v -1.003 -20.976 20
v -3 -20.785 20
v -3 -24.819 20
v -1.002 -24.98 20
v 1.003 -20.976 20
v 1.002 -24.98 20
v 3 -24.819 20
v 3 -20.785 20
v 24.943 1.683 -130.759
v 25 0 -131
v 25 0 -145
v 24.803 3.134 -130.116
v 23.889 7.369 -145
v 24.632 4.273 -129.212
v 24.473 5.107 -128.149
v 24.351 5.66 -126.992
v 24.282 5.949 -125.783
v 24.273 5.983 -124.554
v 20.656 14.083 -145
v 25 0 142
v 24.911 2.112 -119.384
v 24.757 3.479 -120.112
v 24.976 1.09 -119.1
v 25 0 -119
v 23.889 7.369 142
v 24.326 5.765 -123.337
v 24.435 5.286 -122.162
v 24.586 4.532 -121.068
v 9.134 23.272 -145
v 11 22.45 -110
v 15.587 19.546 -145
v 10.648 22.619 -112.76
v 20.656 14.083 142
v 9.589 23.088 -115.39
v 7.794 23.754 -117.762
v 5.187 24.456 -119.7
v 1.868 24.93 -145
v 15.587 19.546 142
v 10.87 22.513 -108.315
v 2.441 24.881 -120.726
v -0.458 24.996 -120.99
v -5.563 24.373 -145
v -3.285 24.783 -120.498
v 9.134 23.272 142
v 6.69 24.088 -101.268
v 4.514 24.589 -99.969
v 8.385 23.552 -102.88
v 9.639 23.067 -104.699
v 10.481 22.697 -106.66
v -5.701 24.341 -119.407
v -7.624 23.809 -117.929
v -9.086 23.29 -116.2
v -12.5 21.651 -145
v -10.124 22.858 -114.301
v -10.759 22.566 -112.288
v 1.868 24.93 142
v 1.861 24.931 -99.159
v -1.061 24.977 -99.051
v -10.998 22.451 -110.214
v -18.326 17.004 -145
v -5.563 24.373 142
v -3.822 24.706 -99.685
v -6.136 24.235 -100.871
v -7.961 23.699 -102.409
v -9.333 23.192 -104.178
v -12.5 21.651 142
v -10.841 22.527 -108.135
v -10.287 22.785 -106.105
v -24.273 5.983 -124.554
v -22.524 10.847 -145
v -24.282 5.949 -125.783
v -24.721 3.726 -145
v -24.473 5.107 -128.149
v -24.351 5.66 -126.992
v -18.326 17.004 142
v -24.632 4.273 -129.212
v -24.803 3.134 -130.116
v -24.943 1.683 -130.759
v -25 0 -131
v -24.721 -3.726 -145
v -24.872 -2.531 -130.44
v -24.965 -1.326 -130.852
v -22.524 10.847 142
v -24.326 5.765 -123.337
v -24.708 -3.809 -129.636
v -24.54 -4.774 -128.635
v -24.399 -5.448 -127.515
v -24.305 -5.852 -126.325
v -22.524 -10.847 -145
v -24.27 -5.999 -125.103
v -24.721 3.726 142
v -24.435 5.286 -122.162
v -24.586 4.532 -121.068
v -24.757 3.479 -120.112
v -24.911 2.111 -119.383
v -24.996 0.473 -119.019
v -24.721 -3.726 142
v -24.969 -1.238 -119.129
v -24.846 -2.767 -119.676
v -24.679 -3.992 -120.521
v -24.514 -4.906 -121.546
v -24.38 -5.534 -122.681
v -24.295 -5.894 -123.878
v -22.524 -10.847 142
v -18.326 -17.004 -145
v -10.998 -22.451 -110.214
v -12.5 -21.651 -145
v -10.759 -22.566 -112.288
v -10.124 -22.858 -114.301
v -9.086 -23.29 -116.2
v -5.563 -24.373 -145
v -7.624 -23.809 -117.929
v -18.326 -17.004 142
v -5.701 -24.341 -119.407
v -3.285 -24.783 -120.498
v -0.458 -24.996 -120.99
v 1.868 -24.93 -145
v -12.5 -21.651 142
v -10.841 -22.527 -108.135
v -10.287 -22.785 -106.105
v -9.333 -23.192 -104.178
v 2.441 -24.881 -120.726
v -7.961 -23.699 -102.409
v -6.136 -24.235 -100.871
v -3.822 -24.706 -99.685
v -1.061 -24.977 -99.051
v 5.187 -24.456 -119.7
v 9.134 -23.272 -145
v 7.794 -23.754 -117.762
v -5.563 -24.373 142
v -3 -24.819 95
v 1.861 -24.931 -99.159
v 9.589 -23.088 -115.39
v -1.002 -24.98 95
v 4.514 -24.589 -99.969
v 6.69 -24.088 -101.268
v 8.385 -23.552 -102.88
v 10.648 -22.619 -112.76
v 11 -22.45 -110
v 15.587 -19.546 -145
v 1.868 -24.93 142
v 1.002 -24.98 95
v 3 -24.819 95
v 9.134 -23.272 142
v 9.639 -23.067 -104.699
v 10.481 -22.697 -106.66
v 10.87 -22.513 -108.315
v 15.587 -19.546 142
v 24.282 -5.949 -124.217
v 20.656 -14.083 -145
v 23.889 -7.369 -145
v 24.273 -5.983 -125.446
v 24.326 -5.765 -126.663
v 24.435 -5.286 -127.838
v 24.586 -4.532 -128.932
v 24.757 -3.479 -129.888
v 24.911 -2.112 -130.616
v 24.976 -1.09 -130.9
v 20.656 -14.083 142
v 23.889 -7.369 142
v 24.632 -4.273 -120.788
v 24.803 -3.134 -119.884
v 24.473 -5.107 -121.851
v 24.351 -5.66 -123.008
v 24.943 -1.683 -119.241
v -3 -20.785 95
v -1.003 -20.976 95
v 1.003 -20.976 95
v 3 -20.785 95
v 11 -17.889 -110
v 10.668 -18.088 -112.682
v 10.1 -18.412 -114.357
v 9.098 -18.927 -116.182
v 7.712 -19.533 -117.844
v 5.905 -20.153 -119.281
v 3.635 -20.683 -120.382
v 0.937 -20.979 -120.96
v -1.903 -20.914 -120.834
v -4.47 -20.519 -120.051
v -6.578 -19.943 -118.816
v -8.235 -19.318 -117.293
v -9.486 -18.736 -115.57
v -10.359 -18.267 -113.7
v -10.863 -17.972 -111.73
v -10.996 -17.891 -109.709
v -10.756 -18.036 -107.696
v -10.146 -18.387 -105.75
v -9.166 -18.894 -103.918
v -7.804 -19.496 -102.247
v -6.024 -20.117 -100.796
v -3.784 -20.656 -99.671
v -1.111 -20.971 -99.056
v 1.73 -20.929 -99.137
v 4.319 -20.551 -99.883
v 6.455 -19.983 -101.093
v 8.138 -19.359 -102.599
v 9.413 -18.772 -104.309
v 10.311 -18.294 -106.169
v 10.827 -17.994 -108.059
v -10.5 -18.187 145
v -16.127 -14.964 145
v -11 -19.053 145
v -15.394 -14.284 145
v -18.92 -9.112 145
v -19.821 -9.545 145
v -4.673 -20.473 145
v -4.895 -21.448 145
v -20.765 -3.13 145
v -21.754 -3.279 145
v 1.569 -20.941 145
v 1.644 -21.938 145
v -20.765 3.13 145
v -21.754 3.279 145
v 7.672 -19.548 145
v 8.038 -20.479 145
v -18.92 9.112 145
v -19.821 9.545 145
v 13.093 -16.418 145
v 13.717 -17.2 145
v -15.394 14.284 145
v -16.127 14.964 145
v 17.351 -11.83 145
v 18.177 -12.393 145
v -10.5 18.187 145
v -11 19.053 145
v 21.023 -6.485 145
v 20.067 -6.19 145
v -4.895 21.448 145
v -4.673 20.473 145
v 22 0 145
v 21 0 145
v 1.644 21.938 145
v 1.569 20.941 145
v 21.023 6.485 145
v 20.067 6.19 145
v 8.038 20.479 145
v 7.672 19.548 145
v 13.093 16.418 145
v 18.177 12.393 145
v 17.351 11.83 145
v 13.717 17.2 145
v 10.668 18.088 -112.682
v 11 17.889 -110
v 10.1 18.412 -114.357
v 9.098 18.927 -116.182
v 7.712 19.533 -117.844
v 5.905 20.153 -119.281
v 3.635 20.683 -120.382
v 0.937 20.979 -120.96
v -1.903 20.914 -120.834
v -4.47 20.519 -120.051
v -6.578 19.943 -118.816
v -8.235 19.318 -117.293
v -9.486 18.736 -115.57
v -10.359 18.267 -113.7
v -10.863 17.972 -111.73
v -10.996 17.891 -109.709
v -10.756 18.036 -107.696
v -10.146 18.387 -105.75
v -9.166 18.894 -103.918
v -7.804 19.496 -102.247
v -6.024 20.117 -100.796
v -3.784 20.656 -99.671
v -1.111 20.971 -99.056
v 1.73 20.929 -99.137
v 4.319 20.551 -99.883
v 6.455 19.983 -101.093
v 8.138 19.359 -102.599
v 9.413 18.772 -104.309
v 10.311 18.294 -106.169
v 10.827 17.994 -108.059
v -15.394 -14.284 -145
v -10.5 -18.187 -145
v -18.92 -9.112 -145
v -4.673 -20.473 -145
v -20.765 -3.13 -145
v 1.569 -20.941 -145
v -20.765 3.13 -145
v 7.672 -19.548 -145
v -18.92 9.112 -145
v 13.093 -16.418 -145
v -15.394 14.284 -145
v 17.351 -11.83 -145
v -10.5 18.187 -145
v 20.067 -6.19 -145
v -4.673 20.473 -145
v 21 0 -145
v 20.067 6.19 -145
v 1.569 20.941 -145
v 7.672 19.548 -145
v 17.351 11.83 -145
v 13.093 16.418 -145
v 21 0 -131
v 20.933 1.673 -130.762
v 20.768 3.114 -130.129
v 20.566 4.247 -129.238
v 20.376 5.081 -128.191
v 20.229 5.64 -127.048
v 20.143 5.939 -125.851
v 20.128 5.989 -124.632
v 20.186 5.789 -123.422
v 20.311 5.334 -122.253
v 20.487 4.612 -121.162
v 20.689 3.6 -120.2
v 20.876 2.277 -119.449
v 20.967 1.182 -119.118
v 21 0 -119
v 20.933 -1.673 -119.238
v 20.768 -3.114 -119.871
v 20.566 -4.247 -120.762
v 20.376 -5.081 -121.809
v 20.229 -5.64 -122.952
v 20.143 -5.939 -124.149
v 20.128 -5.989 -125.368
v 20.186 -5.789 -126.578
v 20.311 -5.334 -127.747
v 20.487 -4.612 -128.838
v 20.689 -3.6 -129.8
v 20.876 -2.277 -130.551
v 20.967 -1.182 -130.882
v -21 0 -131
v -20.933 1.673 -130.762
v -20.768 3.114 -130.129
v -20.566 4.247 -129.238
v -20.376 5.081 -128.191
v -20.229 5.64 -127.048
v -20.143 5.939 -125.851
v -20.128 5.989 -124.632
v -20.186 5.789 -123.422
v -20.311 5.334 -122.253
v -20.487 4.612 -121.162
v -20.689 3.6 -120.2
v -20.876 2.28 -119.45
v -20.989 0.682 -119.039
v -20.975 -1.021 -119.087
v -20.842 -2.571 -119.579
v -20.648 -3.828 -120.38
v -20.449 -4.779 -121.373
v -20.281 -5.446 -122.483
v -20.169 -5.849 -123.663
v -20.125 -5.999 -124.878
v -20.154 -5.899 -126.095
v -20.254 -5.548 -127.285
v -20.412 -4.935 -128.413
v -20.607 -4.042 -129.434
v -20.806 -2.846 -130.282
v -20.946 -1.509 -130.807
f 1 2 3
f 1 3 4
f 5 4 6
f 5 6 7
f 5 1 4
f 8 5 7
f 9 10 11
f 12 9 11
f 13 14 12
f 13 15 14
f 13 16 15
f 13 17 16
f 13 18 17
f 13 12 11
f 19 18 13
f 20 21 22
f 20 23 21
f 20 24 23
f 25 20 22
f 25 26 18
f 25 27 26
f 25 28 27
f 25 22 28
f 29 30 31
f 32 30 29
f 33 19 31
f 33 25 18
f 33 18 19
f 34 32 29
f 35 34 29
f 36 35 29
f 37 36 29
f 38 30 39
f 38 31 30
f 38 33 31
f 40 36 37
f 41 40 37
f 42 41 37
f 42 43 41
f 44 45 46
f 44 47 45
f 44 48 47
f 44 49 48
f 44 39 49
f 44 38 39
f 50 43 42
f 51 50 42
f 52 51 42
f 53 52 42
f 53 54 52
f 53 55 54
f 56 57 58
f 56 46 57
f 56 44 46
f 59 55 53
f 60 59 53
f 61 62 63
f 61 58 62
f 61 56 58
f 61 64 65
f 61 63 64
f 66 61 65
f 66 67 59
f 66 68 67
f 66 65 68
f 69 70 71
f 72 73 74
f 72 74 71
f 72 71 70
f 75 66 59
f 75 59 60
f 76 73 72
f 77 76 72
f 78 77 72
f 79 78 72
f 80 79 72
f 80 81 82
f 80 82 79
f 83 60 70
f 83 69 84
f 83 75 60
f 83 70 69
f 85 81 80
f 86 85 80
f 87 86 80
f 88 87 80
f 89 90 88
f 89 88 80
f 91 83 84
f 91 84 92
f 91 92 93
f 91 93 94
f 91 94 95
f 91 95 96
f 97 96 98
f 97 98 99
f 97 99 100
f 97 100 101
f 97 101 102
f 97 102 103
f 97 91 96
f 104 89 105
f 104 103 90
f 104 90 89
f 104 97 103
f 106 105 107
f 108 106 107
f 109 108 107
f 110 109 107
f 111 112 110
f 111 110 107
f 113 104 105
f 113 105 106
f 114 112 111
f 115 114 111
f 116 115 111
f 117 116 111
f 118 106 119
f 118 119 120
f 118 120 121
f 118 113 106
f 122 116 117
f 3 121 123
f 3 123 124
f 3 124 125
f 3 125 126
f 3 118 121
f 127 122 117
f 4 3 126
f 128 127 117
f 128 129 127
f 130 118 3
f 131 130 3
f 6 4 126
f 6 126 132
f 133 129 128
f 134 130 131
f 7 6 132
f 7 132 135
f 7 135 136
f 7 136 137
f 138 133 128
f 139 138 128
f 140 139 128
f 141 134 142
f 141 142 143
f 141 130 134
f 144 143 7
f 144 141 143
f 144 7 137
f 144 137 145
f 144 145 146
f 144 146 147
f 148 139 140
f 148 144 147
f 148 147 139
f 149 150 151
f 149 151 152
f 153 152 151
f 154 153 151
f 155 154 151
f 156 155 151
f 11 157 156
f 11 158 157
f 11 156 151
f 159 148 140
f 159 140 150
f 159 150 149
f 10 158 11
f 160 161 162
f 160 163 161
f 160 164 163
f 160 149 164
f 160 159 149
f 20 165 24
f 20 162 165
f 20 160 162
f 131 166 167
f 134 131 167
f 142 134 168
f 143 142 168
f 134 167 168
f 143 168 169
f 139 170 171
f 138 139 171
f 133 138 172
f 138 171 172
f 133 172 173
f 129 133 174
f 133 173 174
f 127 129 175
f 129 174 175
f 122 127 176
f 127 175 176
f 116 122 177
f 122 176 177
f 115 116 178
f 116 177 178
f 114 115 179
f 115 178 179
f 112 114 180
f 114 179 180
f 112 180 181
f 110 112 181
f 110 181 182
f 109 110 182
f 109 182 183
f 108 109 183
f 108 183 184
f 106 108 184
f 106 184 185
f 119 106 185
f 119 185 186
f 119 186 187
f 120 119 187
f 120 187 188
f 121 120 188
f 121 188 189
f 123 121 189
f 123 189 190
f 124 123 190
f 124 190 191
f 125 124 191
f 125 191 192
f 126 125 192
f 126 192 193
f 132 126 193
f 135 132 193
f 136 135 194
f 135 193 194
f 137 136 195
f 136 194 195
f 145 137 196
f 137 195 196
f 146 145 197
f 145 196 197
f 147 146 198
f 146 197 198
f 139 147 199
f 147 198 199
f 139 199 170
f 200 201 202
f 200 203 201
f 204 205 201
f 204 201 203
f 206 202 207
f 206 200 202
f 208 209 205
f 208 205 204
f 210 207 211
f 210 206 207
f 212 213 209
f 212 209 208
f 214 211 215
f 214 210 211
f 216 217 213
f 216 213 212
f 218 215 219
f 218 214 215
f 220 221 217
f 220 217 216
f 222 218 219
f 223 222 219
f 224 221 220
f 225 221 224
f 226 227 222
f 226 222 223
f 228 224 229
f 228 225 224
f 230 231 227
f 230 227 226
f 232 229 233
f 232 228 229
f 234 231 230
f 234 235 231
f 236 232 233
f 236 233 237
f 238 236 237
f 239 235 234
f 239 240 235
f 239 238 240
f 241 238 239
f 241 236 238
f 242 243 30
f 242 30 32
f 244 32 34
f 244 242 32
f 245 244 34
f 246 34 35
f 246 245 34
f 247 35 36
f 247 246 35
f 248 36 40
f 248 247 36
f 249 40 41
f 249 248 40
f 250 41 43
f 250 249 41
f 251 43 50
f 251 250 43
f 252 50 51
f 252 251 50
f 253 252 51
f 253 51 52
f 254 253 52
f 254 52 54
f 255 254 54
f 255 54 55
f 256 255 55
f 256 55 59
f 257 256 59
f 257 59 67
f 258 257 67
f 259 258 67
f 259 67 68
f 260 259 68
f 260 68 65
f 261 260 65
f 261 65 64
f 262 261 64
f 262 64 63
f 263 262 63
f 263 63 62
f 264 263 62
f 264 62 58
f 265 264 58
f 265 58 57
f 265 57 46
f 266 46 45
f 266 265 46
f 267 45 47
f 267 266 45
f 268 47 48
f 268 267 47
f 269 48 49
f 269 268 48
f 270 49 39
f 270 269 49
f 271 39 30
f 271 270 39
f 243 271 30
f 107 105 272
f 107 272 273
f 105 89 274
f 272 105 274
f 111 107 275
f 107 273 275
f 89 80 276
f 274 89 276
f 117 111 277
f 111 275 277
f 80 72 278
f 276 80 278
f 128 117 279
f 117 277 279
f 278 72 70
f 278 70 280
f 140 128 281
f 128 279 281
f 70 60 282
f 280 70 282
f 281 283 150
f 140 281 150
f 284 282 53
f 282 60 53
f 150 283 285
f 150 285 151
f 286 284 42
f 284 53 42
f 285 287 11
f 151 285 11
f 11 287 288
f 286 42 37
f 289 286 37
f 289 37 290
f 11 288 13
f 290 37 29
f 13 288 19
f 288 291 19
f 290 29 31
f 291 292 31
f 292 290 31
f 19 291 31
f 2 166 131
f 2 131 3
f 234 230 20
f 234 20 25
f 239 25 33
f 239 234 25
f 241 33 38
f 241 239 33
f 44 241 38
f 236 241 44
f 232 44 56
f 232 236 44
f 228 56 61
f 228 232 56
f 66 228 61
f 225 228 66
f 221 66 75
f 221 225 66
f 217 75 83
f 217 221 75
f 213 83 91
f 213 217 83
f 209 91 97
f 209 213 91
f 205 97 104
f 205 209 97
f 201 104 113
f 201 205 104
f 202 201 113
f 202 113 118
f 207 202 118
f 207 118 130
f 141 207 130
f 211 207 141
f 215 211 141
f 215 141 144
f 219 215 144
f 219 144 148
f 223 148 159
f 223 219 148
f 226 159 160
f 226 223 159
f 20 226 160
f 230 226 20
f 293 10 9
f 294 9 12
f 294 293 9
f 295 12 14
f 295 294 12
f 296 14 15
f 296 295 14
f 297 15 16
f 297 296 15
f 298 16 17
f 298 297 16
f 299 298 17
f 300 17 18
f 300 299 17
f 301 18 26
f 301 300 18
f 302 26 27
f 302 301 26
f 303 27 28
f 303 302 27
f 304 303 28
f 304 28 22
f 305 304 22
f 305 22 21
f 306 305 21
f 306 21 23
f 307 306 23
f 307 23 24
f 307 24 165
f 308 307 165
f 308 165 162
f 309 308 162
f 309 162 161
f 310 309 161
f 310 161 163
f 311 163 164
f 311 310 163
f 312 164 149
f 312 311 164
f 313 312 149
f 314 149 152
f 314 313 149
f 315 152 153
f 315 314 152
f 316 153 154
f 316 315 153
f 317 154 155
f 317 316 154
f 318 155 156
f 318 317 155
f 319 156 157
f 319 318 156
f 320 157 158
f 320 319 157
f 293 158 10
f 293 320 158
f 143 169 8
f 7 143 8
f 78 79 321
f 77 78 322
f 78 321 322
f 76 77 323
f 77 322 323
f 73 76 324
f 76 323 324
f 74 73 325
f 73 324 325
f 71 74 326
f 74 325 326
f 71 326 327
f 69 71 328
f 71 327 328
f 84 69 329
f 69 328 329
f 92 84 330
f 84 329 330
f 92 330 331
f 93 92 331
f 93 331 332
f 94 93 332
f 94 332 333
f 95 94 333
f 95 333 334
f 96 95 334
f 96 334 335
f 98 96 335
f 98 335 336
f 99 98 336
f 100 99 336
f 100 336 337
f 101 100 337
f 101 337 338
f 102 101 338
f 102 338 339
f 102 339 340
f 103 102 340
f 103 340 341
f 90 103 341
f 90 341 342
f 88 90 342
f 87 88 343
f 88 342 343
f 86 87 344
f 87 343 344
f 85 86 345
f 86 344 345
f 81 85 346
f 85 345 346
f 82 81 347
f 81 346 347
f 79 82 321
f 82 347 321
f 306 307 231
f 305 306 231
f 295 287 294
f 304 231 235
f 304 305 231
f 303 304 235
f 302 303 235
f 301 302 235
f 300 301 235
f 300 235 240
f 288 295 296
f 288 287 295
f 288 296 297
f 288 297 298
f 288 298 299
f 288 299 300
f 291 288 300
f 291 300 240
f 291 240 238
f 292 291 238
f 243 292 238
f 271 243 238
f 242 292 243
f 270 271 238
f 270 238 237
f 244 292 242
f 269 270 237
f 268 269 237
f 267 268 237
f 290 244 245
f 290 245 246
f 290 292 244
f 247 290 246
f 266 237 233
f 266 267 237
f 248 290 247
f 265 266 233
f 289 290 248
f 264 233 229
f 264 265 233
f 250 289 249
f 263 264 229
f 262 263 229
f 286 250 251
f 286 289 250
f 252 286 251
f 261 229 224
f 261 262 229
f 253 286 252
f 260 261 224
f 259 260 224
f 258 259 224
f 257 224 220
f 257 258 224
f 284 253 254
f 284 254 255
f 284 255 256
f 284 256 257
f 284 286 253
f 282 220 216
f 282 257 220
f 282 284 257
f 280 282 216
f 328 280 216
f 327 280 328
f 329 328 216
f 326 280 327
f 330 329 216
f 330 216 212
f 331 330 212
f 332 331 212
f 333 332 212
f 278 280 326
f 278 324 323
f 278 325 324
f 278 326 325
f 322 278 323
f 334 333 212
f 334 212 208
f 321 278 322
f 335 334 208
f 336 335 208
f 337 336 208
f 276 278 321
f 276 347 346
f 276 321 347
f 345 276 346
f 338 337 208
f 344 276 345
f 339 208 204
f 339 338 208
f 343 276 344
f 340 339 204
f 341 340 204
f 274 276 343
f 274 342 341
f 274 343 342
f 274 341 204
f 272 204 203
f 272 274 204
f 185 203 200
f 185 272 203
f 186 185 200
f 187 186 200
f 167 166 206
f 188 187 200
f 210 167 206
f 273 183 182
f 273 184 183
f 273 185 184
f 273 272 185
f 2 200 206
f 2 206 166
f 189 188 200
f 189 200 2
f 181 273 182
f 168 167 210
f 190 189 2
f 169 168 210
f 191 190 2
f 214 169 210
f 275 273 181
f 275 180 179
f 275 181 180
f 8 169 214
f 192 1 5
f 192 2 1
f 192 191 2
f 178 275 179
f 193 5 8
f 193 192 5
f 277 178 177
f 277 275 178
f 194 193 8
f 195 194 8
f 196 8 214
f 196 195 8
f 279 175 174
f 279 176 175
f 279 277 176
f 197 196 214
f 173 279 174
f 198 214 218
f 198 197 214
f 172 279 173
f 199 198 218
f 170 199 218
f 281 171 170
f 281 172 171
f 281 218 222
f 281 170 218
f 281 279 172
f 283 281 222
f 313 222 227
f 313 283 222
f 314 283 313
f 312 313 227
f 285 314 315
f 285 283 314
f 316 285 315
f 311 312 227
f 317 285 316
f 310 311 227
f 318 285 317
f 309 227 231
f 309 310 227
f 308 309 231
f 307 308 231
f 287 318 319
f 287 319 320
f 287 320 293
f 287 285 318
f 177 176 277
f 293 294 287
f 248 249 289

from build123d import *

# Parameters (mm, degrees)
SKETCH1_R               = 25
SKETCH1_R_2             = 21
BOSS_EXTRUDE1_DEPTH     = 145
CHAMFER1_SIZE           = 3
SKETCH2_R               = 11
CUT_EXTRUDE1_DEPTH      = 26
CUT_EXTRUDE1_DEPTH_BACK = 26
SKETCH3_R               = 6
CUT_EXTRUDE2_DEPTH      = 26.0000001
CUT_EXTRUDE2_DEPTH_BACK = 26.0000001
CUT_EXTRUDE3_REACH      = 27
SKETCH4_W               = 6
SKETCH4_H               = 75


with BuildPart() as part:
    # Sketch1 → Boss-Extrude1 (new body, symmetric)
    with BuildSketch(Plane.XY):
        Circle(SKETCH1_R)
        Circle(SKETCH1_R_2, mode=Mode.SUBTRACT)
    extrude(amount=BOSS_EXTRUDE1_DEPTH, both=True)

    # Chamfer1
    chamfer1_edges = [part.edges().sort_by_distance(p)[0] for p in [
        (-25, 0, 145),
    ]]
    chamfer(chamfer1_edges, length=CHAMFER1_SIZE)

    # Sketch2 → Cut-Extrude1 (cut, two sides)
    with BuildSketch(Plane(origin=(0, 0, 0), x_dir=(1, 0, 0), z_dir=(0, 1, 0))) as cut_extrude1_sk:
        with Locations((0, 110)):
            Circle(SKETCH2_R)
    extrude(amount=CUT_EXTRUDE1_DEPTH, mode=Mode.SUBTRACT)
    extrude(cut_extrude1_sk.sketch, amount=-CUT_EXTRUDE1_DEPTH_BACK, mode=Mode.SUBTRACT)

    # Sketch3 → Cut-Extrude2 (cut, two sides)
    with BuildSketch(Plane(origin=(0, 0, 0), x_dir=(0, 0, -1), z_dir=(1, 0, 0))) as cut_extrude2_sk:
        with Locations((125, 0)):
            Circle(SKETCH3_R)
    extrude(amount=CUT_EXTRUDE2_DEPTH, mode=Mode.SUBTRACT)
    extrude(cut_extrude2_sk.sketch, amount=-CUT_EXTRUDE2_DEPTH_BACK, mode=Mode.SUBTRACT)

    # Sketch4 → Cut-Extrude3 (cut, up to next)
    with BuildSketch(Plane(origin=(0, 0, 0), x_dir=(1, 0, 0), z_dir=(0, 1, 0)), mode=Mode.PRIVATE) as cut_extrude3_sk1:
        with Locations((0, -57.5)):
            Rectangle(SKETCH4_W, SKETCH4_H)
    cut_extrude3_tool1 = extrude(cut_extrude3_sk1.sketch, amount=-CUT_EXTRUDE3_REACH, mode=Mode.PRIVATE) & part.part
    add(cut_extrude3_tool1.solids().sort_by_distance((0, 0, 57.5))[0], mode=Mode.SUBTRACT)


solid = part.part
